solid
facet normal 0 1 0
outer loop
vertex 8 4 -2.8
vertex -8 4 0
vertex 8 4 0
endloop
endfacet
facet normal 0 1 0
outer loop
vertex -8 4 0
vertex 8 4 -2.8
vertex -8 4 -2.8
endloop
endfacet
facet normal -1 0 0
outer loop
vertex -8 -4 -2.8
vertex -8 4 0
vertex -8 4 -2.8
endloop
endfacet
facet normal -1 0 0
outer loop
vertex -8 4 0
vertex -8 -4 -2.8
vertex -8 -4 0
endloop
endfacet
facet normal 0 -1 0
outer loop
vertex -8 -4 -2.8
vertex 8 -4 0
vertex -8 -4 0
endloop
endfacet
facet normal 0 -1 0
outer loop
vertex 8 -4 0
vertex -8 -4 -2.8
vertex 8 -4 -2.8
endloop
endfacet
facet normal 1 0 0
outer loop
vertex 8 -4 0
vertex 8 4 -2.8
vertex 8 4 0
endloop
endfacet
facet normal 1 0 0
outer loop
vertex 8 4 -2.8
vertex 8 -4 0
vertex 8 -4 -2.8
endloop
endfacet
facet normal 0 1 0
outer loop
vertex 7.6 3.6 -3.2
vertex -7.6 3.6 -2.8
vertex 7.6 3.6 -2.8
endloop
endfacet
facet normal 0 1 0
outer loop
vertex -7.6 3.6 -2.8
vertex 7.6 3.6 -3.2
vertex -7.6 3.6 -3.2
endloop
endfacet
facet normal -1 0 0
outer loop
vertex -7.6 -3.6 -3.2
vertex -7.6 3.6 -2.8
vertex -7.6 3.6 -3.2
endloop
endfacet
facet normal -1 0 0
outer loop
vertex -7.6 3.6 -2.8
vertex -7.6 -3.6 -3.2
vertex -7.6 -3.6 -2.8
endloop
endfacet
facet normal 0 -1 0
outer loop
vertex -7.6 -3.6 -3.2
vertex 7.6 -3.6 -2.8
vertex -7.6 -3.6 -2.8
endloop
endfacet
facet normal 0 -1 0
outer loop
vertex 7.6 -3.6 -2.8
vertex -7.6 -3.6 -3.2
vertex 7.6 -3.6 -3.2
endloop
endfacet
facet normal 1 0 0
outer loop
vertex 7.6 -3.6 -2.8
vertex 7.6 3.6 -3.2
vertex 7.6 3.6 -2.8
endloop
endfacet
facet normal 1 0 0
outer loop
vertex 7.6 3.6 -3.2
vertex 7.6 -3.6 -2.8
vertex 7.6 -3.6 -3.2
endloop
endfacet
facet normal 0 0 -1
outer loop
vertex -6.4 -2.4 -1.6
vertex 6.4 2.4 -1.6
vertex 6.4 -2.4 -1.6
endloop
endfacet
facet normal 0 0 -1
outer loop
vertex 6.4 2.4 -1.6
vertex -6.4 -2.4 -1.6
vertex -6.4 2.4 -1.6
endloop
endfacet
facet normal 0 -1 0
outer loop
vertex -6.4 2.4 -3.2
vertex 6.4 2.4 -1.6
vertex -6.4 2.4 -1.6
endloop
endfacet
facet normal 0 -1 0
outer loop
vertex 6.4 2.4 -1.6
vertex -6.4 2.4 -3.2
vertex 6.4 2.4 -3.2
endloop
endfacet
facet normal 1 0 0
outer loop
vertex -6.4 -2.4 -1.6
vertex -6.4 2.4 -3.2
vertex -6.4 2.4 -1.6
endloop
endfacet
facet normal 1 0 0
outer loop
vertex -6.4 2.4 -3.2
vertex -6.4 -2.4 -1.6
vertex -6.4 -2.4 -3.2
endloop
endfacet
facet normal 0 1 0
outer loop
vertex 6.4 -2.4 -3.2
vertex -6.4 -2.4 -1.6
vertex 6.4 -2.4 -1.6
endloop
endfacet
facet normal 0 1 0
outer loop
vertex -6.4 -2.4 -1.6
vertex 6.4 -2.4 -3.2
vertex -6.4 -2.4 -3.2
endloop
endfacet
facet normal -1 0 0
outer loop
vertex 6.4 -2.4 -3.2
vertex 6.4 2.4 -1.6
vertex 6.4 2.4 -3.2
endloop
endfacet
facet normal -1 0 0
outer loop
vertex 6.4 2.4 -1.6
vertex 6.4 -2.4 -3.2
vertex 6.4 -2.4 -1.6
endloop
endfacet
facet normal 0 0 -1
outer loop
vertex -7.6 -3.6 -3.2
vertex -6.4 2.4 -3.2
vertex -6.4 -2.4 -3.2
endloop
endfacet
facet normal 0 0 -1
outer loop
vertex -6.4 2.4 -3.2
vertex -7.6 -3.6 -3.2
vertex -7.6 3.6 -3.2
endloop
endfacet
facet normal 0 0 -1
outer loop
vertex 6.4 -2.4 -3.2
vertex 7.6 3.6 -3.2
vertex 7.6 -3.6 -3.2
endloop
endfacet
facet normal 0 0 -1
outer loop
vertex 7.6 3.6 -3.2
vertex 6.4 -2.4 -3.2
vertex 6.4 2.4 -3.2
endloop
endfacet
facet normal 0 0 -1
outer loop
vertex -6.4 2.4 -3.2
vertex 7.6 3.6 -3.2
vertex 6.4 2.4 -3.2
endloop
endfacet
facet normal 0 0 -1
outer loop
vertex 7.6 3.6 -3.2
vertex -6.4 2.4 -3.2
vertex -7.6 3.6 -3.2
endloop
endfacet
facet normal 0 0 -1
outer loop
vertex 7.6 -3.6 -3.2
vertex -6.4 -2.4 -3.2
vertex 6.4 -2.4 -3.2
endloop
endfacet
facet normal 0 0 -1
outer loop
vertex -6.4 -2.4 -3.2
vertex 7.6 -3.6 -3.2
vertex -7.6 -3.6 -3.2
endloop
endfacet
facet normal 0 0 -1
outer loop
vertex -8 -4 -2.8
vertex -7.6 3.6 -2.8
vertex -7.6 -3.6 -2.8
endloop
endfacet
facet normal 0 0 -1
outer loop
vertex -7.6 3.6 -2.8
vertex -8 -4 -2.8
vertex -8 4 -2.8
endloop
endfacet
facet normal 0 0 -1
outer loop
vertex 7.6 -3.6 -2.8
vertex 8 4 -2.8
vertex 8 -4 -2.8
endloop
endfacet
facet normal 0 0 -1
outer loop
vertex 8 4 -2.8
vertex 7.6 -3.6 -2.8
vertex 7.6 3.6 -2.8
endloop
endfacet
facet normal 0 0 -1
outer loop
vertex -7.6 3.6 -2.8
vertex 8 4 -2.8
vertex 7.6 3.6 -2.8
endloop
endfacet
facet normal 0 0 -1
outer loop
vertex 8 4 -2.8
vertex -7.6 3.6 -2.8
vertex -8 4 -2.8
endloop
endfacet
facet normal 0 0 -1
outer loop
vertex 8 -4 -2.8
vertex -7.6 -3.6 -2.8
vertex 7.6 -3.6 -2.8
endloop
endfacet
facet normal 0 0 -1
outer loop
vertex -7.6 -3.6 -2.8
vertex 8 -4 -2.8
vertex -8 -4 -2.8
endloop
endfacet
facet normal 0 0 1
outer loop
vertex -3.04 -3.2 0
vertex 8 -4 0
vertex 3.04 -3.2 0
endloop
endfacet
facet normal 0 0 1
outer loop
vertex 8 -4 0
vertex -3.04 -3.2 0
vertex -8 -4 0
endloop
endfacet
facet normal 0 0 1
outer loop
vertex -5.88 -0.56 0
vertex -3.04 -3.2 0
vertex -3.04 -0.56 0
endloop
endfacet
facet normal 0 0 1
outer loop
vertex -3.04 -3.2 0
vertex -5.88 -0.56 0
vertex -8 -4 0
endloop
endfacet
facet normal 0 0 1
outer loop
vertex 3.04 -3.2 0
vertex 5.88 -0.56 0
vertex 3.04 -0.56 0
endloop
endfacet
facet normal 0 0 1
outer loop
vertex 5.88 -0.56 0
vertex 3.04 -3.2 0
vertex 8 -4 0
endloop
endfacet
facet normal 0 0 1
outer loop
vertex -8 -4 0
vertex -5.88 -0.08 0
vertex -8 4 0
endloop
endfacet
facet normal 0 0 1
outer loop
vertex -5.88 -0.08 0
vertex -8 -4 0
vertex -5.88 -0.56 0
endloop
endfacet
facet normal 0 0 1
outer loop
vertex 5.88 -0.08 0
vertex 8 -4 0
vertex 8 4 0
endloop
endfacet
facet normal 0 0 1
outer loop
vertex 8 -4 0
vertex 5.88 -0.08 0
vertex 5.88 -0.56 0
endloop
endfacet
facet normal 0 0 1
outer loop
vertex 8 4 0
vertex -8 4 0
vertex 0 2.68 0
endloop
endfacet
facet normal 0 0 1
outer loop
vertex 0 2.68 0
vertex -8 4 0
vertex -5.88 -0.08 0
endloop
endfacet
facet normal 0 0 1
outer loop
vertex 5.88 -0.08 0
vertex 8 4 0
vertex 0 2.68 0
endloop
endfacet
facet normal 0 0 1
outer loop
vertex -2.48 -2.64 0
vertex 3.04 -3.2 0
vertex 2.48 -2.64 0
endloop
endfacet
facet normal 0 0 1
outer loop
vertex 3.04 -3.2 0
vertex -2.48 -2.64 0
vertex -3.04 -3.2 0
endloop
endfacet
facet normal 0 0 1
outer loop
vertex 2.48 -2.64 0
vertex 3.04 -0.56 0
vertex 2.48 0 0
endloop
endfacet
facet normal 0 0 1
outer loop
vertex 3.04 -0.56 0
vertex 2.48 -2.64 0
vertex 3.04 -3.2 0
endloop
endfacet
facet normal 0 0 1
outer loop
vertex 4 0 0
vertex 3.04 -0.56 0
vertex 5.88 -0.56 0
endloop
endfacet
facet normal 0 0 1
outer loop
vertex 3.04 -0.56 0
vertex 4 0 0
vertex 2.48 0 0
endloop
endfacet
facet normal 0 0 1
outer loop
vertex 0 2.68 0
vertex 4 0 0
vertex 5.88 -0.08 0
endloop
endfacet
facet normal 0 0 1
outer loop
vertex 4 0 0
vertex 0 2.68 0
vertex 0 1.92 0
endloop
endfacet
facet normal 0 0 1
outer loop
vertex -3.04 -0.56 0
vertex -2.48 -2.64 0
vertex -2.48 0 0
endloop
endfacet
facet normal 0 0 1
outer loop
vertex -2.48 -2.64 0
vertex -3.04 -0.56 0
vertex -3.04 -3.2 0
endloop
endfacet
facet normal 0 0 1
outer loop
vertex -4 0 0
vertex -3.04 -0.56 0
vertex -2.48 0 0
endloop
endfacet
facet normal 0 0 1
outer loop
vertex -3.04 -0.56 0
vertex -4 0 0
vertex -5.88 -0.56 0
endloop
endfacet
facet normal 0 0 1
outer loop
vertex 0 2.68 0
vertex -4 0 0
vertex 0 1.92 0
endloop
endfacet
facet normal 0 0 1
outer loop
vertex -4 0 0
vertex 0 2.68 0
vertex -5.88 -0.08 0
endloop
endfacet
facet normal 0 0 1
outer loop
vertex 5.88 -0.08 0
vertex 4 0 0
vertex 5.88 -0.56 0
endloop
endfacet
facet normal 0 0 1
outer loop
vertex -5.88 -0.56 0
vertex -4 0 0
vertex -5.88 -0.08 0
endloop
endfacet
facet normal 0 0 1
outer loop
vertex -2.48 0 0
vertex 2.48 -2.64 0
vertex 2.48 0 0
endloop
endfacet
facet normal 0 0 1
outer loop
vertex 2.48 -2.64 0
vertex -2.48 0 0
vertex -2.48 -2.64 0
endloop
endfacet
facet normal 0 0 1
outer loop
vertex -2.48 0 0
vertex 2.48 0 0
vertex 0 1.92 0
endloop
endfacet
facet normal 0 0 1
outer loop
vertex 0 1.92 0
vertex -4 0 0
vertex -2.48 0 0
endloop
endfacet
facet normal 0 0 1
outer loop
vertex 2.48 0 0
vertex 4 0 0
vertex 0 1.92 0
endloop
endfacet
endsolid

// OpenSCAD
// file: ../p/4-4edge.scad
use <../lib.scad>
$fa=1; $fs=0.2;
function ldraw_lib__4_4edge(realsolid=false) = [
// 0 Circle 1.0
// 0 Name: 4-4edge.dat
// 0 Author: James Jessiman
// 0 !LDRAW_ORG Primitive UPDATE 2017-01
// 0 !LICENSE Licensed under CC BY 2.0 and CC BY 4.0 : see CAreadme.txt
// 
// 0 BFC CERTIFY CCW
  [0,"BFC","CERTIFY"],
  [0,"BFC","CCW"],
// 
// 0 !HISTORY 1998-12-15 [PTadmin] Official Update 1998-10
// 0 !HISTORY 2005-12-28 [PTadmin] Official Update 2005-01
// 0 !HISTORY 2007-06-24 [PTadmin] Header formatted for Contributor Agreement
// 0 !HISTORY 2008-07-01 [PTadmin] Official Update 2008-01
// 0 !HISTORY 2017-01-15 [Steffen] BFCed
// 0 !HISTORY 2017-12-30 [PTadmin] Official Update 2017-01
// 
// 
// 2 24 1 0 0 0.9239 0 0.3827
  [2,24,1,0,0,0.9239,0,0.3827],
// 2 24 0.9239 0 0.3827 0.7071 0 0.7071
  [2,24,0.9239,0,0.3827,0.7071,0,0.7071],
// 2 24 0.7071 0 0.7071 0.3827 0 0.9239
  [2,24,0.7071,0,0.7071,0.3827,0,0.9239],
// 2 24 0.3827 0 0.9239 0 0 1
  [2,24,0.3827,0,0.9239,0,0,1],
// 2 24 0 0 1 -0.3827 0 0.9239
  [2,24,0,0,1,-0.3827,0,0.9239],
// 2 24 -0.3827 0 0.9239 -0.7071 0 0.7071
  [2,24,-0.3827,0,0.9239,-0.7071,0,0.7071],
// 2 24 -0.7071 0 0.7071 -0.9239 0 0.3827
  [2,24,-0.7071,0,0.7071,-0.9239,0,0.3827],
// 2 24 -0.9239 0 0.3827 -1 0 -0
  [2,24,-0.9239,0,0.3827,-1,0,-0],
// 2 24 -1 0 -0 -0.9239 0 -0.3827
  [2,24,-1,0,-0,-0.9239,0,-0.3827],
// 2 24 -0.9239 0 -0.3827 -0.7071 0 -0.7071
  [2,24,-0.9239,0,-0.3827,-0.7071,0,-0.7071],
// 2 24 -0.7071 0 -0.7071 -0.3827 0 -0.9239
  [2,24,-0.7071,0,-0.7071,-0.3827,0,-0.9239],
// 2 24 -0.3827 0 -0.9239 0 0 -1
  [2,24,-0.3827,0,-0.9239,0,0,-1],
// 2 24 0 0 -1 0.3827 0 -0.9239
  [2,24,0,0,-1,0.3827,0,-0.9239],
// 2 24 0.3827 0 -0.9239 0.7071 0 -0.7071
  [2,24,0.3827,0,-0.9239,0.7071,0,-0.7071],
// 2 24 0.7071 0 -0.7071 0.9239 0 -0.3827
  [2,24,0.7071,0,-0.7071,0.9239,0,-0.3827],
// 2 24 0.9239 0 -0.3827 1 0 0
  [2,24,0.9239,0,-0.3827,1,0,0],
];
module ldraw_lib__4_4edge(step=0, col=false, unit=2/5, alt=false, line=0.2, solid=!$preview)
    makepoly(ldraw_lib__4_4edge(solid), step=step, col=col, unit=unit, alt=alt, line=line, solid=solid);
ldraw_lib__4_4edge(line=0.2);
// file: ../p/4-4disc.scad
use <../lib.scad>
$fa=1; $fs=0.2;
function ldraw_lib__4_4disc(realsolid=false) = [
// 0 Disc 1.0
// 0 Name: 4-4disc.dat
// 0 Author: James Jessiman
// 0 !LDRAW_ORG Primitive UPDATE 2002-02
// 0 !LICENSE Licensed under CC BY 2.0 and CC BY 4.0 : see CAreadme.txt
// 
// 0 BFC CERTIFY CCW
  [0,"BFC","CERTIFY"],
  [0,"BFC","CCW"],
// 
// 0 !HISTORY 1998-12-15 [PTadmin] Official Update 1998-10
// 0 !HISTORY 2002-03-23 [sbliss] Added BFC statement
// 0 !HISTORY 2002-04-25 [PTadmin] Official Update 2002-02
// 0 !HISTORY 2007-06-24 [PTadmin] Header formatted for Contributor Agreement
// 0 !HISTORY 2008-07-01 [PTadmin] Official Update 2008-01
// 
// 
// 3 16 0 0 0 1 0 0 0.9239 0 0.3827
  [3,16,0,0,0,1,0,0,0.9239,0,0.3827],
// 3 16 0 0 0 0.9239 0 0.3827 0.7071 0 0.7071
  [3,16,0,0,0,0.9239,0,0.3827,0.7071,0,0.7071],
// 3 16 0 0 0 0.7071 0 0.7071 0.3827 0 0.9239
  [3,16,0,0,0,0.7071,0,0.7071,0.3827,0,0.9239],
// 3 16 0 0 0 0.3827 0 0.9239 0 0 1
  [3,16,0,0,0,0.3827,0,0.9239,0,0,1],
// 3 16 0 0 0 0 0 1 -0.3827 0 0.9239
  [3,16,0,0,0,0,0,1,-0.3827,0,0.9239],
// 3 16 0 0 0 -0.3827 0 0.9239 -0.7071 0 0.7071
  [3,16,0,0,0,-0.3827,0,0.9239,-0.7071,0,0.7071],
// 3 16 0 0 0 -0.7071 0 0.7071 -0.9239 0 0.3827
  [3,16,0,0,0,-0.7071,0,0.7071,-0.9239,0,0.3827],
// 3 16 0 0 0 -0.9239 0 0.3827 -1 0 -0
  [3,16,0,0,0,-0.9239,0,0.3827,-1,0,-0],
// 3 16 0 0 0 -1 0 -0 -0.9239 0 -0.3827
  [3,16,0,0,0,-1,0,-0,-0.9239,0,-0.3827],
// 3 16 0 0 0 -0.9239 0 -0.3827 -0.7071 0 -0.7071
  [3,16,0,0,0,-0.9239,0,-0.3827,-0.7071,0,-0.7071],
// 3 16 0 0 0 -0.7071 0 -0.7071 -0.3827 0 -0.9239
  [3,16,0,0,0,-0.7071,0,-0.7071,-0.3827,0,-0.9239],
// 3 16 0 0 0 -0.3827 0 -0.9239 0 0 -1
  [3,16,0,0,0,-0.3827,0,-0.9239,0,0,-1],
// 3 16 0 0 0 0 0 -1 0.3827 0 -0.9239
  [3,16,0,0,0,0,0,-1,0.3827,0,-0.9239],
// 3 16 0 0 0 0.3827 0 -0.9239 0.7071 0 -0.7071
  [3,16,0,0,0,0.3827,0,-0.9239,0.7071,0,-0.7071],
// 3 16 0 0 0 0.7071 0 -0.7071 0.9239 0 -0.3827
  [3,16,0,0,0,0.7071,0,-0.7071,0.9239,0,-0.3827],
// 3 16 0 0 0 0.9239 0 -0.3827 1 0 0
  [3,16,0,0,0,0.9239,0,-0.3827,1,0,0],
// 0
];
module ldraw_lib__4_4disc(step=0, col=false, unit=2/5, alt=false, line=0.2, solid=!$preview)
    makepoly(ldraw_lib__4_4disc(solid), step=step, col=col, unit=unit, alt=alt, line=line, solid=solid);
ldraw_lib__4_4disc(line=0.2);
// file: ../p/4-4cyli.scad
use <../lib.scad>
$fa=1; $fs=0.2;
function ldraw_lib__4_4cyli(realsolid=false) = [
// 0 Cylinder 1.0
// 0 Name: 4-4cyli.dat
// 0 Author: James Jessiman
// 0 !LDRAW_ORG Primitive UPDATE 2005-01
// 0 !LICENSE Licensed under CC BY 2.0 and CC BY 4.0 : see CAreadme.txt
// 
// 0 BFC CERTIFY CCW
  [0,"BFC","CERTIFY"],
  [0,"BFC","CCW"],
// 
// 0 !HISTORY 1998-12-15 [PTadmin] Official Update 1998-10
// 0 !HISTORY 2002-03-23 [sbliss] Added BFC statement; merged headers from files in distributions LDraw 0.27 and Complete.
// 0 !HISTORY 2002-04-25 [PTadmin] Official Update 2002-02
// 0 !HISTORY 2004-12-14 [guyvivan] BFC CCW
// 0 !HISTORY 2005-12-28 [PTadmin] Official Update 2005-01
// 0 !HISTORY 2007-06-24 [PTadmin] Header formatted for Contributor Agreement
// 0 !HISTORY 2008-07-01 [PTadmin] Official Update 2008-01
// 
// 
// 4 16 1 1 0 0.9239 1 0.3827 0.9239 0 0.3827 1 0 0
  [4,16,1,1,0,0.9239,1,0.3827,0.9239,0,0.3827,1,0,0],
// 5 24 1 0 0 1 1 0 0.9239 0 0.3827 0.9239 0 -0.3827
  [5,24,1,0,0,1,1,0,0.9239,0,0.3827,0.9239,0,-0.3827],
// 4 16 0.9239 1 0.3827 0.7071 1 0.7071 0.7071 0 0.7071 0.9239 0 0.3827
  [4,16,0.9239,1,0.3827,0.7071,1,0.7071,0.7071,0,0.7071,0.9239,0,0.3827],
// 5 24 0.9239 0 0.3827 0.9239 1 0.3827 0.7071 0 0.7071 1 0 0
  [5,24,0.9239,0,0.3827,0.9239,1,0.3827,0.7071,0,0.7071,1,0,0],
// 4 16 0.7071 1 0.7071 0.3827 1 0.9239 0.3827 0 0.9239 0.7071 0 0.7071
  [4,16,0.7071,1,0.7071,0.3827,1,0.9239,0.3827,0,0.9239,0.7071,0,0.7071],
// 5 24 0.7071 0 0.7071 0.7071 1 0.7071 0.3827 0 0.9239 0.9239 0 0.3827
  [5,24,0.7071,0,0.7071,0.7071,1,0.7071,0.3827,0,0.9239,0.9239,0,0.3827],
// 4 16 0.3827 1 0.9239 0 1 1 0 0 1 0.3827 0 0.9239
  [4,16,0.3827,1,0.9239,0,1,1,0,0,1,0.3827,0,0.9239],
// 5 24 0.3827 0 0.9239 0.3827 1 0.9239 0 0 1 0.7071 0 0.7071
  [5,24,0.3827,0,0.9239,0.3827,1,0.9239,0,0,1,0.7071,0,0.7071],
// 4 16 0 1 1 -0.3827 1 0.9239 -0.3827 0 0.9239 0 0 1
  [4,16,0,1,1,-0.3827,1,0.9239,-0.3827,0,0.9239,0,0,1],
// 5 24 0 0 1 0 1 1 -0.3827 0 0.9239 0.3827 0 0.9239
  [5,24,0,0,1,0,1,1,-0.3827,0,0.9239,0.3827,0,0.9239],
// 4 16 -0.3827 1 0.9239 -0.7071 1 0.7071 -0.7071 0 0.7071 -0.3827 0 0.9239
  [4,16,-0.3827,1,0.9239,-0.7071,1,0.7071,-0.7071,0,0.7071,-0.3827,0,0.9239],
// 5 24 -0.3827 0 0.9239 -0.3827 1 0.9239 -0.7071 0 0.7071 0 0 1
  [5,24,-0.3827,0,0.9239,-0.3827,1,0.9239,-0.7071,0,0.7071,0,0,1],
// 4 16 -0.7071 1 0.7071 -0.9239 1 0.3827 -0.9239 0 0.3827 -0.7071 0 0.7071
  [4,16,-0.7071,1,0.7071,-0.9239,1,0.3827,-0.9239,0,0.3827,-0.7071,0,0.7071],
// 5 24 -0.7071 0 0.7071 -0.7071 1 0.7071 -0.9239 0 0.3827 -0.3827 0 0.9239
  [5,24,-0.7071,0,0.7071,-0.7071,1,0.7071,-0.9239,0,0.3827,-0.3827,0,0.9239],
// 4 16 -0.9239 1 0.3827 -1 1 0 -1 0 0 -0.9239 0 0.3827
  [4,16,-0.9239,1,0.3827,-1,1,0,-1,0,0,-0.9239,0,0.3827],
// 5 24 -0.9239 0 0.3827 -0.9239 1 0.3827 -1 0 0 -0.7071 0 0.7071
  [5,24,-0.9239,0,0.3827,-0.9239,1,0.3827,-1,0,0,-0.7071,0,0.7071],
// 4 16 -1 1 0 -0.9239 1 -0.3827 -0.9239 0 -0.3827 -1 0 0
  [4,16,-1,1,0,-0.9239,1,-0.3827,-0.9239,0,-0.3827,-1,0,0],
// 5 24 -1 0 0 -1 1 0 -0.9239 0 -0.3827 -0.9239 0 0.3827
  [5,24,-1,0,0,-1,1,0,-0.9239,0,-0.3827,-0.9239,0,0.3827],
// 4 16 -0.9239 1 -0.3827 -0.7071 1 -0.7071 -0.7071 0 -0.7071 -0.9239 0 -0.3827
  [4,16,-0.9239,1,-0.3827,-0.7071,1,-0.7071,-0.7071,0,-0.7071,-0.9239,0,-0.3827],
// 5 24 -0.9239 0 -0.3827 -0.9239 1 -0.3827 -0.7071 0 -0.7071 -1 0 0
  [5,24,-0.9239,0,-0.3827,-0.9239,1,-0.3827,-0.7071,0,-0.7071,-1,0,0],
// 4 16 -0.7071 1 -0.7071 -0.3827 1 -0.9239 -0.3827 0 -0.9239 -0.7071 0 -0.7071
  [4,16,-0.7071,1,-0.7071,-0.3827,1,-0.9239,-0.3827,0,-0.9239,-0.7071,0,-0.7071],
// 5 24 -0.7071 0 -0.7071 -0.7071 1 -0.7071 -0.3827 0 -0.9239 -0.9239 0 -0.3827
  [5,24,-0.7071,0,-0.7071,-0.7071,1,-0.7071,-0.3827,0,-0.9239,-0.9239,0,-0.3827],
// 4 16 -0.3827 1 -0.9239 0 1 -1 0 0 -1 -0.3827 0 -0.9239
  [4,16,-0.3827,1,-0.9239,0,1,-1,0,0,-1,-0.3827,0,-0.9239],
// 5 24 -0.3827 0 -0.9239 -0.3827 1 -0.9239 0 0 -1 -0.7071 0 -0.7071
  [5,24,-0.3827,0,-0.9239,-0.3827,1,-0.9239,0,0,-1,-0.7071,0,-0.7071],
// 4 16 0 1 -1 0.3827 1 -0.9239 0.3827 0 -0.9239 0 0 -1
  [4,16,0,1,-1,0.3827,1,-0.9239,0.3827,0,-0.9239,0,0,-1],
// 5 24 0 0 -1 0 1 -1 0.3827 0 -0.9239 -0.3827 0 -0.9239
  [5,24,0,0,-1,0,1,-1,0.3827,0,-0.9239,-0.3827,0,-0.9239],
// 4 16 0.3827 1 -0.9239 0.7071 1 -0.7071 0.7071 0 -0.7071 0.3827 0 -0.9239
  [4,16,0.3827,1,-0.9239,0.7071,1,-0.7071,0.7071,0,-0.7071,0.3827,0,-0.9239],
// 5 24 0.3827 0 -0.9239 0.3827 1 -0.9239 0.7071 0 -0.7071 0 0 -1
  [5,24,0.3827,0,-0.9239,0.3827,1,-0.9239,0.7071,0,-0.7071,0,0,-1],
// 4 16 0.7071 1 -0.7071 0.9239 1 -0.3827 0.9239 0 -0.3827 0.7071 0 -0.7071
  [4,16,0.7071,1,-0.7071,0.9239,1,-0.3827,0.9239,0,-0.3827,0.7071,0,-0.7071],
// 5 24 0.7071 0 -0.7071 0.7071 1 -0.7071 0.9239 0 -0.3827 0.3827 0 -0.9239
  [5,24,0.7071,0,-0.7071,0.7071,1,-0.7071,0.9239,0,-0.3827,0.3827,0,-0.9239],
// 4 16 0.9239 1 -0.3827 1 1 0 1 0 0 0.9239 0 -0.3827
  [4,16,0.9239,1,-0.3827,1,1,0,1,0,0,0.9239,0,-0.3827],
// 5 24 0.9239 0 -0.3827 0.9239 1 -0.3827 1 0 0 0.7071 0 -0.7071
  [5,24,0.9239,0,-0.3827,0.9239,1,-0.3827,1,0,0,0.7071,0,-0.7071],
// 0
];
module ldraw_lib__4_4cyli(step=0, col=false, unit=2/5, alt=false, line=0.2, solid=!$preview)
    makepoly(ldraw_lib__4_4cyli(solid), step=step, col=col, unit=unit, alt=alt, line=line, solid=solid);
ldraw_lib__4_4cyli(line=0.2);
// file: ../p/stud3.scad
use <../lib.scad>
use <4-4cyli.scad>
use <4-4disc.scad>
use <4-4edge.scad>
$fa=1; $fs=0.2;
function ldraw_lib__stud3(realsolid=false) = realsolid ? 
    [openscad(translate([0,0,-eps()], o=cylinder(4+eps(), r=4)),2)] : [
// 0 Stud Tube Solid
// 0 Name: stud3.dat
// 0 Author: James Jessiman
// 0 !LDRAW_ORG Primitive UPDATE 2012-01
// 0 !LICENSE Licensed under CC BY 2.0 and CC BY 4.0 : see CAreadme.txt
// 
// 0 BFC CERTIFY CCW
  [0,"BFC","CERTIFY"],
  [0,"BFC","CCW"],
// 
// 0 !HISTORY 2002-04-04 [sbliss] Modified for BFC compliance
// 0 !HISTORY 2002-04-25 [PTadmin] Official Update 2002-02
// 0 !HISTORY 2007-06-24 [PTadmin] Header formatted for Contributor Agreement
// 0 !HISTORY 2008-07-01 [PTadmin] Official Update 2008-01
// 0 !HISTORY 2012-02-16 [Philo] Changed to CCW
// 0 !HISTORY 2012-03-30 [PTadmin] Official Update 2012-01
// 
// 
// 1 16 0 -4 0 4 0 0 0 1 0 0 0 4 4-4edge.dat
  [1,16,0,-4,0,4,0,0,0,1,0,0,0,4, ldraw_lib__4_4edge(realsolid)],
// 1 16 0 0 0 4 0 0 0 1 0 0 0 4 4-4edge.dat
  [1,16,0,0,0,4,0,0,0,1,0,0,0,4, ldraw_lib__4_4edge(realsolid)],
// 1 16 0 -4 0 4 0 0 0 1 0 0 0 4 4-4disc.dat
  [1,16,0,-4,0,4,0,0,0,1,0,0,0,4, ldraw_lib__4_4disc(realsolid)],
// 1 16 0 -4 0 4 0 0 0 4 0 0 0 4 4-4cyli.dat
  [1,16,0,-4,0,4,0,0,0,4,0,0,0,4, ldraw_lib__4_4cyli(realsolid)],
];
module ldraw_lib__stud3(step=0, col=false, unit=2/5, alt=false, line=0.2, solid=!$preview)
    makepoly(ldraw_lib__stud3(solid), step=step, col=col, unit=unit, alt=alt, line=line, solid=solid);
ldraw_lib__stud3(line=0.2);
// file: ../p/stud.scad
use <../lib.scad>
use <4-4cyli.scad>
use <4-4disc.scad>
use <4-4edge.scad>
$fa=1; $fs=0.2;
function ldraw_lib__stud(realsolid=false) = realsolid ? 
    [openscad(translate([0,0,-eps()], o=cylinder(4+eps(), r=6)),2)] : [
// 0 Stud
// 0 Name: stud.dat
// 0 Author: James Jessiman
// 0 !LDRAW_ORG Primitive UPDATE 2012-01
// 0 !LICENSE Licensed under CC BY 2.0 and CC BY 4.0 : see CAreadme.txt
// 
// 0 BFC CERTIFY CCW
  [0,"BFC","CERTIFY"],
  [0,"BFC","CCW"],
// 
// 0 !HISTORY 2002-04-04 [sbliss] Modified for BFC compliance
// 0 !HISTORY 2002-04-25 [PTadmin] Official Update 2002-02
// 0 !HISTORY 2007-06-24 [PTadmin] Header formatted for Contributor Agreement
// 0 !HISTORY 2008-07-01 [PTadmin] Official Update 2008-01
// 0 !HISTORY 2012-02-16 [Philo] Changed to CCW
// 0 !HISTORY 2012-03-30 [PTadmin] Official Update 2012-01
// 
// 
// 1 16 0 0 0 6 0 0 0 1 0 0 0 6 4-4edge.dat
  [1,16,0,0,0,6,0,0,0,1,0,0,0,6, ldraw_lib__4_4edge(realsolid)],
// 1 16 0 -4 0 6 0 0 0 1 0 0 0 6 4-4edge.dat
  [1,16,0,-4,0,6,0,0,0,1,0,0,0,6, ldraw_lib__4_4edge(realsolid)],
// 1 16 0 0 0 6 0 0 0 -4 0 0 0 6 4-4cyli.dat
  [1,16,0,0,0,6,0,0,0,-4,0,0,0,6, ldraw_lib__4_4cyli(realsolid)],
// 1 16 0 -4 0 6 0 0 0 1 0 0 0 6 4-4disc.dat
  [1,16,0,-4,0,6,0,0,0,1,0,0,0,6, ldraw_lib__4_4disc(realsolid)],
];
module ldraw_lib__stud(step=0, col=false, unit=2/5, alt=false, line=0.2, solid=!$preview)
    makepoly(ldraw_lib__stud(solid), step=step, col=col, unit=unit, alt=alt, line=line, solid=solid);
ldraw_lib__stud(line=0.2);
// file: ../p/box4t.scad
use <../lib.scad>
$fa=1; $fs=0.2;
function ldraw_lib__box4t(realsolid=false) = [
// 0 Box with 4 Adjacent Faces and All Edges
// 0 Name: box4t.dat
// 0 Author: Tore Eriksson [Tore_Eriksson]
// 0 !LDRAW_ORG Primitive UPDATE 2003-02
// 0 !LICENSE Licensed under CC BY 2.0 and CC BY 4.0 : see CAreadme.txt
// 
// 0 BFC CERTIFY CCW
  [0,"BFC","CERTIFY"],
  [0,"BFC","CCW"],
// 
// 0 !HISTORY 1997-09-29 [PTadmin] Official Update 1997-15
// 0 !HISTORY 2002-08-31 [izanette] Modified with WINDZ for BFC compliance
// 0 !HISTORY 2003-08-01 [PTadmin] Official Update 2003-02
// 0 !HISTORY 2007-06-24 [PTadmin] Header formatted for Contributor Agreement
// 0 !HISTORY 2008-07-01 [PTadmin] Official Update 2008-01
// 
// 
// 2 24 1 1 1 -1 1 1
  [2,24,1,1,1,-1,1,1],
// 2 24 -1 1 1 -1 1 -1
  [2,24,-1,1,1,-1,1,-1],
// 2 24 -1 1 -1 1 1 -1
  [2,24,-1,1,-1,1,1,-1],
// 2 24 1 1 -1 1 1 1
  [2,24,1,1,-1,1,1,1],
// 2 24 1 0 1 -1 0 1
  [2,24,1,0,1,-1,0,1],
// 2 24 -1 0 1 -1 0 -1
  [2,24,-1,0,1,-1,0,-1],
// 2 24 -1 0 -1 1 0 -1
  [2,24,-1,0,-1,1,0,-1],
// 2 24 1 0 -1 1 0 1
  [2,24,1,0,-1,1,0,1],
// 2 24 1 0 1 1 1 1
  [2,24,1,0,1,1,1,1],
// 2 24 -1 0 1 -1 1 1
  [2,24,-1,0,1,-1,1,1],
// 2 24 1 0 -1 1 1 -1
  [2,24,1,0,-1,1,1,-1],
// 2 24 -1 0 -1 -1 1 -1
  [2,24,-1,0,-1,-1,1,-1],
// 4 16 1 1 1 1 1 -1 -1 1 -1 -1 1 1
  [4,16,1,1,1,1,1,-1,-1,1,-1,-1,1,1],
// 4 16 1 1 1 -1 1 1 -1 0 1 1 0 1
  [4,16,1,1,1,-1,1,1,-1,0,1,1,0,1],
// 4 16 -1 1 1 -1 1 -1 -1 0 -1 -1 0 1
  [4,16,-1,1,1,-1,1,-1,-1,0,-1,-1,0,1],
// 0 4 16 -1 1 -1 -1 0 -1 1 0 -1 1 1 -1
// 4 16 1 1 -1 1 1 1 1 0 1 1 0 -1
  [4,16,1,1,-1,1,1,1,1,0,1,1,0,-1],
// 0
];
module ldraw_lib__box4t(step=0, col=false, unit=2/5, alt=false, line=0.2, solid=!$preview)
    makepoly(ldraw_lib__box4t(solid), step=step, col=col, unit=unit, alt=alt, line=line, solid=solid);
ldraw_lib__box4t(line=0.2);
// file: ../p/box5.scad
use <../lib.scad>
$fa=1; $fs=0.2;
function ldraw_lib__box5(realsolid=false) = [
// 0 Box with 5 Faces and All Edges
// 0 Name: box5.dat
// 0 Author: James Jessiman
// 0 !LDRAW_ORG Primitive UPDATE 2012-01
// 0 !LICENSE Licensed under CC BY 2.0 and CC BY 4.0 : see CAreadme.txt
// 
// 0 BFC CERTIFY CCW
  [0,"BFC","CERTIFY"],
  [0,"BFC","CCW"],
// 
// 0 !HISTORY 2002-04-03 [sbliss] Modified for BFC compliance
// 0 !HISTORY 2002-04-25 [PTadmin] Official Update 2002-02
// 0 !HISTORY 2007-06-24 [PTadmin] Header formatted for Contributor Agreement
// 0 !HISTORY 2008-07-01 [PTadmin] Official Update 2008-01
// 0 !HISTORY 2012-02-16 [Philo] Changed to CCW
// 0 !HISTORY 2012-03-30 [PTadmin] Official Update 2012-01
// 
// 
// 2 24 1 1 1 -1 1 1
  [2,24,1,1,1,-1,1,1],
// 2 24 -1 1 1 -1 1 -1
  [2,24,-1,1,1,-1,1,-1],
// 2 24 -1 1 -1 1 1 -1
  [2,24,-1,1,-1,1,1,-1],
// 2 24 1 1 -1 1 1 1
  [2,24,1,1,-1,1,1,1],
// 2 24 1 0 1 -1 0 1
  [2,24,1,0,1,-1,0,1],
// 2 24 -1 0 1 -1 0 -1
  [2,24,-1,0,1,-1,0,-1],
// 2 24 -1 0 -1 1 0 -1
  [2,24,-1,0,-1,1,0,-1],
// 2 24 1 0 -1 1 0 1
  [2,24,1,0,-1,1,0,1],
// 2 24 1 0 1 1 1 1
  [2,24,1,0,1,1,1,1],
// 2 24 -1 0 1 -1 1 1
  [2,24,-1,0,1,-1,1,1],
// 2 24 1 0 -1 1 1 -1
  [2,24,1,0,-1,1,1,-1],
// 2 24 -1 0 -1 -1 1 -1
  [2,24,-1,0,-1,-1,1,-1],
// 4 16 -1 1 1 1 1 1 1 1 -1 -1 1 -1
  [4,16,-1,1,1,1,1,1,1,1,-1,-1,1,-1],
// 4 16 -1 1 1 -1 0 1 1 0 1 1 1 1
  [4,16,-1,1,1,-1,0,1,1,0,1,1,1,1],
// 4 16 -1 1 -1 -1 0 -1 -1 0 1 -1 1 1
  [4,16,-1,1,-1,-1,0,-1,-1,0,1,-1,1,1],
// 4 16 1 1 -1 1 0 -1 -1 0 -1 -1 1 -1
  [4,16,1,1,-1,1,0,-1,-1,0,-1,-1,1,-1],
// 4 16 1 1 1 1 0 1 1 0 -1 1 1 -1
  [4,16,1,1,1,1,0,1,1,0,-1,1,1,-1],
];
module ldraw_lib__box5(step=0, col=false, unit=2/5, alt=false, line=0.2, solid=!$preview)
    makepoly(ldraw_lib__box5(solid), step=step, col=col, unit=unit, alt=alt, line=line, solid=solid);
ldraw_lib__box5(line=0.2);
// file: ../p/box4.scad
use <../lib.scad>
$fa=1; $fs=0.2;
function ldraw_lib__box4(realsolid=false) = [
// 0 Box with 4 Faces (2 Parallel Pairs) and All Edges
// 0 Name: box4.dat
// 0 Author: James Jessiman
// 0 !LDRAW_ORG Primitive UPDATE 2012-01
// 0 !LICENSE Licensed under CC BY 2.0 and CC BY 4.0 : see CAreadme.txt
// 
// 0 BFC CERTIFY CCW
  [0,"BFC","CERTIFY"],
  [0,"BFC","CCW"],
// 
// 0 !HISTORY 2002-04-03 [sbliss] Modified for BFC compliance
// 0 !HISTORY 2002-04-25 [PTadmin] Official Update 2002-02
// 0 !HISTORY 2007-06-24 [PTadmin] Header formatted for Contributor Agreement
// 0 !HISTORY 2008-07-01 [PTadmin] Official Update 2008-01
// 0 !HISTORY 2012-02-16 [Philo] Changed to CCW
// 0 !HISTORY 2012-03-30 [PTadmin] Official Update 2012-01
// 
// 
// 2 24 1 1 1 -1 1 1
  [2,24,1,1,1,-1,1,1],
// 2 24 -1 1 1 -1 1 -1
  [2,24,-1,1,1,-1,1,-1],
// 2 24 -1 1 -1 1 1 -1
  [2,24,-1,1,-1,1,1,-1],
// 2 24 1 1 -1 1 1 1
  [2,24,1,1,-1,1,1,1],
// 2 24 1 0 1 -1 0 1
  [2,24,1,0,1,-1,0,1],
// 2 24 -1 0 1 -1 0 -1
  [2,24,-1,0,1,-1,0,-1],
// 2 24 -1 0 -1 1 0 -1
  [2,24,-1,0,-1,1,0,-1],
// 2 24 1 0 -1 1 0 1
  [2,24,1,0,-1,1,0,1],
// 2 24 1 0 1 1 1 1
  [2,24,1,0,1,1,1,1],
// 2 24 -1 0 1 -1 1 1
  [2,24,-1,0,1,-1,1,1],
// 2 24 1 0 -1 1 1 -1
  [2,24,1,0,-1,1,1,-1],
// 2 24 -1 0 -1 -1 1 -1
  [2,24,-1,0,-1,-1,1,-1],
// 4 16 -1 1 1 -1 0 1 1 0 1 1 1 1
  [4,16,-1,1,1,-1,0,1,1,0,1,1,1,1],
// 4 16 -1 1 -1 -1 0 -1 -1 0 1 -1 1 1
  [4,16,-1,1,-1,-1,0,-1,-1,0,1,-1,1,1],
// 4 16 1 1 -1 1 0 -1 -1 0 -1 -1 1 -1
  [4,16,1,1,-1,1,0,-1,-1,0,-1,-1,1,-1],
// 4 16 1 1 1 1 0 1 1 0 -1 1 1 -1
  [4,16,1,1,1,1,0,1,1,0,-1,1,1,-1],
];
module ldraw_lib__box4(step=0, col=false, unit=2/5, alt=false, line=0.2, solid=!$preview)
    makepoly(ldraw_lib__box4(solid), step=step, col=col, unit=unit, alt=alt, line=line, solid=solid);
ldraw_lib__box4(line=0.2);
// file: s/3004s01.scad
use <../../lib.scad>
use <../../p/box4t.scad>
use <../../p/box5.scad>
use <../../p/stud.scad>
use <../../p/stud3.scad>
$fa=1; $fs=0.2;
function ldraw_lib__s__3004s01(realsolid=false) = [
// 0 ~Brick  1 x  2 without Front Face
// 0 Name: s\3004s01.dat
// 0 Author: James Jessiman
// 0 !LDRAW_ORG Subpart UPDATE 2003-03
// 0 !LICENSE Licensed under CC BY 2.0 and CC BY 4.0 : see CAreadme.txt
// 
// 0 BFC CERTIFY CCW
  [0,"BFC","CERTIFY"],
  [0,"BFC","CCW"],
// 
// 0 !HISTORY 2003-09-07 [jriley] Subfiling, BFC
// 0 !HISTORY 2003-12-19 [PTadmin] Official Update 2003-03
// 0 !HISTORY 2007-08-29 [PTadmin] Header formatted for Contributor Agreement
// 0 !HISTORY 2008-07-01 [PTadmin] Official Update 2008-01
// 
// 
// 1 16 0 4 0 1 0 0 0 -5 0 0 0 1 stud3.dat
  [1,16,0,4,0,1,0,0,0,-5,0,0,0,1, ldraw_lib__stud3(realsolid)],
// 0 BFC INVERTNEXT
  [0,"BFC","INVERTNEXT"],
// 1 16 0 24 0 16 0 0 0 -20 0 0 0 6 box5.dat
  [1,16,0,24,0,16,0,0,0,-20,0,0,0,6, ldraw_lib__box5(realsolid)],
// 4 16 20 24 10 16 24 6 -16 24 6 -20 24 10
  [4,16,20,24,10,16,24,6,-16,24,6,-20,24,10],
// 4 16 -20 24 10 -16 24 6 -16 24 -6 -20 24 -10
  [4,16,-20,24,10,-16,24,6,-16,24,-6,-20,24,-10],
// 4 16 -20 24 -10 -16 24 -6 16 24 -6 20 24 -10
  [4,16,-20,24,-10,-16,24,-6,16,24,-6,20,24,-10],
// 4 16 20 24 -10 16 24 -6 16 24 6 20 24 10
  [4,16,20,24,-10,16,24,-6,16,24,6,20,24,10],
// 1 16 0 24 0 20 0 0 0 -24 0 0 0 10 box4t.dat
  [1,16,0,24,0,20,0,0,0,-24,0,0,0,10, ldraw_lib__box4t(realsolid)],
// 1 16 10 0 0 1 0 0 0 1 0 0 0 1 stud.dat
  [1,16,10,0,0,1,0,0,0,1,0,0,0,1, ldraw_lib__stud(realsolid)],
// 1 16 -10 0 0 1 0 0 0 1 0 0 0 1 stud.dat
  [1,16,-10,0,0,1,0,0,0,1,0,0,0,1, ldraw_lib__stud(realsolid)],
// 0
];
module ldraw_lib__s__3004s01(step=0, col=false, unit=2/5, alt=false, line=0.2, solid=!$preview)
    makepoly(ldraw_lib__s__3004s01(solid), step=step, col=col, unit=unit, alt=alt, line=line, solid=solid);
ldraw_lib__s__3004s01(line=0.2);
// file: s/3069p13c.scad
use <../../lib.scad>
$fa=1; $fs=0.2;
function ldraw_lib__s__3069p13c(realsolid=false) = [
// 0 ~Tile  1 x  2 with Arrow Short Pattern - Arrow
// 0 Name: s\3069p13c.dat
// 0 Author: Alex Taylor [anathema]
// 0 !LDRAW_ORG Subpart UPDATE 2010-02
// 0 !LICENSE Licensed under CC BY 2.0 and CC BY 4.0 : see CAreadme.txt
// 
// 0 BFC CERTIFY CCW
  [0,"BFC","CERTIFY"],
  [0,"BFC","CCW"],
// 
// 0 !HISTORY 2010-07-05 [PTadmin] Official Update 2010-02
// 
// 
// 4 16 -6.2 0 -6.6 6.2 0 -6.6 6.2 0 0 -6.2 0 0
  [4,16,-6.2,0,-6.6,6.2,0,-6.6,6.2,0,0,-6.2,0,0],
// 3 16 -6.2 0 0 6.2 0 0 0 0 4.8
  [3,16,-6.2,0,0,6.2,0,0,0,0,4.8],
// 3 16 0 0 4.8 -10 0 0 -6.2 0 0
  [3,16,0,0,4.8,-10,0,0,-6.2,0,0],
// 3 16 6.2 0 0 10 0 0 0 0 4.8
  [3,16,6.2,0,0,10,0,0,0,0,4.8],
// 0
];
module ldraw_lib__s__3069p13c(step=0, col=false, unit=2/5, alt=false, line=0.2, solid=!$preview)
    makepoly(ldraw_lib__s__3069p13c(solid), step=step, col=col, unit=unit, alt=alt, line=line, solid=solid);
ldraw_lib__s__3069p13c(line=0.2);
// file: s/3069p13b.scad
use <../../lib.scad>
$fa=1; $fs=0.2;
function ldraw_lib__s__3069p13b(realsolid=false) = [
// 0 ~Tile  1 x  2 with Arrow Short Pattern - Border
// 0 Name: s\3069p13b.dat
// 0 Author: Alex Taylor [anathema]
// 0 !LDRAW_ORG Subpart UPDATE 2010-02
// 0 !LICENSE Licensed under CC BY 2.0 and CC BY 4.0 : see CAreadme.txt
// 
// 0 BFC CERTIFY CCW
  [0,"BFC","CERTIFY"],
  [0,"BFC","CCW"],
// 
// 0 !HISTORY 2010-07-05 [PTadmin] Official Update 2010-02
// 
// 
// 4 16 -7.6 0 -8 7.6 0 -8 6.2 0 -6.6 -6.2 0 -6.6
  [4,16,-7.6,0,-8,7.6,0,-8,6.2,0,-6.6,-6.2,0,-6.6],
// 4 16 6.2 0 0 6.2 0 -6.6 7.6 0 -8 7.6 0 -1.4
  [4,16,6.2,0,0,6.2,0,-6.6,7.6,0,-8,7.6,0,-1.4],
// 4 16 7.6 0 -1.4 14.7 0 -1.4 10 0 0 6.2 0 0
  [4,16,7.6,0,-1.4,14.7,0,-1.4,10,0,0,6.2,0,0],
// 4 16 0 0 4.8 10 0 0 14.7 0 -0.2 0 0 6.7
  [4,16,0,0,4.8,10,0,0,14.7,0,-0.2,0,0,6.7],
// 4 16 -7.6 0 -1.4 -7.6 0 -8 -6.2 0 -6.6 -6.2 0 0
  [4,16,-7.6,0,-1.4,-7.6,0,-8,-6.2,0,-6.6,-6.2,0,0],
// 4 16 -6.2 0 0 -10 0 0 -14.7 0 -1.4 -7.6 0 -1.4
  [4,16,-6.2,0,0,-10,0,0,-14.7,0,-1.4,-7.6,0,-1.4],
// 4 16 0 0 6.7 -14.7 0 -0.2 -10 0 0 0 0 4.8
  [4,16,0,0,6.7,-14.7,0,-0.2,-10,0,0,0,0,4.8],
// 3 16 14.7 0 -0.2 10 0 0 14.7 0 -1.4
  [3,16,14.7,0,-0.2,10,0,0,14.7,0,-1.4],
// 3 16 -14.7 0 -1.4 -10 0 0 -14.7 0 -0.2
  [3,16,-14.7,0,-1.4,-10,0,0,-14.7,0,-0.2],
// 0
];
module ldraw_lib__s__3069p13b(step=0, col=false, unit=2/5, alt=false, line=0.2, solid=!$preview)
    makepoly(ldraw_lib__s__3069p13b(solid), step=step, col=col, unit=unit, alt=alt, line=line, solid=solid);
ldraw_lib__s__3069p13b(line=0.2);
// file: s/3069p13a.scad
use <../../lib.scad>
$fa=1; $fs=0.2;
function ldraw_lib__s__3069p13a(realsolid=false) = [
// 0 ~Tile  1 x  2 with Arrow Short Pattern - Mask
// 0 Name: s\3069p13a.dat
// 0 Author: Alex Taylor [anathema]
// 0 !LDRAW_ORG Subpart UPDATE 2010-02
// 0 !LICENSE Licensed under CC BY 2.0 and CC BY 4.0 : see CAreadme.txt
// 
// 0 BFC CERTIFY CCW
  [0,"BFC","CERTIFY"],
  [0,"BFC","CCW"],
// 
// 0 !HISTORY 2010-07-05 [PTadmin] Official Update 2010-02
// 
// 
// 4 16 -20 0 -10 20 0 -10 7.6 0 -8 -7.6 0 -8
  [4,16,-20,0,-10,20,0,-10,7.6,0,-8,-7.6,0,-8],
// 4 16 -7.6 0 -8 -7.6 0 -1.4 -14.7 0 -1.4 -20 0 -10
  [4,16,-7.6,0,-8,-7.6,0,-1.4,-14.7,0,-1.4,-20,0,-10],
// 4 16 20 0 -10 14.7 0 -1.4 7.6 0 -1.4 7.6 0 -8
  [4,16,20,0,-10,14.7,0,-1.4,7.6,0,-1.4,7.6,0,-8],
// 4 16 -20 0 -10 -14.7 0 -1.4 -14.7 0 -0.2 -20 0 10
  [4,16,-20,0,-10,-14.7,0,-1.4,-14.7,0,-0.2,-20,0,10],
// 4 16 20 0 10 14.7 0 -0.2 14.7 0 -1.4 20 0 -10
  [4,16,20,0,10,14.7,0,-0.2,14.7,0,-1.4,20,0,-10],
// 3 16 20 0 10 -20 0 10 0 0 6.7
  [3,16,20,0,10,-20,0,10,0,0,6.7],
// 3 16 0 0 6.7 -20 0 10 -14.7 0 -0.2
  [3,16,0,0,6.7,-20,0,10,-14.7,0,-0.2],
// 3 16 14.7 0 -0.2 20 0 10 0 0 6.7
  [3,16,14.7,0,-0.2,20,0,10,0,0,6.7],
// 0
];
module ldraw_lib__s__3069p13a(step=0, col=false, unit=2/5, alt=false, line=0.2, solid=!$preview)
    makepoly(ldraw_lib__s__3069p13a(solid), step=step, col=col, unit=unit, alt=alt, line=line, solid=solid);
ldraw_lib__s__3069p13a(line=0.2);
// file: s/3069bs01.scad
use <../../lib.scad>
use <../../p/box4.scad>
use <../../p/box5.scad>
$fa=1; $fs=0.2;
function ldraw_lib__s__3069bs01(realsolid=false) = [
// 0 ~Tile  1 x  2 with Groove without Top Face
// 0 Name: s\3069bs01.dat
// 0 Author: Santeri Piippo [arezey]
// 0 !LDRAW_ORG Subpart UPDATE 2010-02
// 0 !LICENSE Licensed under CC BY 2.0 and CC BY 4.0 : see CAreadme.txt
// 
// 0 BFC CERTIFY CCW
  [0,"BFC","CERTIFY"],
  [0,"BFC","CCW"],
// 
// 0 !HISTORY 2010-07-05 [PTadmin] Official Update 2010-02
// 
// 
// 1 16 0 0 0 20 0 0 0 7 0 0 0 10 box4.dat
  [1,16,0,0,0,20,0,0,0,7,0,0,0,10, ldraw_lib__box4(realsolid)],
// 1 16 0 7 0 19 0 0 0 1 0 0 0 9 box4.dat
  [1,16,0,7,0,19,0,0,0,1,0,0,0,9, ldraw_lib__box4(realsolid)],
// 0 BFC INVERTNEXT
  [0,"BFC","INVERTNEXT"],
// 1 16 0 8 0 16 0 0 0 -4 0 0 0 6 box5.dat
  [1,16,0,8,0,16,0,0,0,-4,0,0,0,6, ldraw_lib__box5(realsolid)],
// 4 16 -19 8 9 -16 8 6 -16 8 -6 -19 8 -9
  [4,16,-19,8,9,-16,8,6,-16,8,-6,-19,8,-9],
// 4 16 19 8 -9 16 8 -6 16 8 6 19 8 9
  [4,16,19,8,-9,16,8,-6,16,8,6,19,8,9],
// 4 16 19 8 9 16 8 6 -16 8 6 -19 8 9
  [4,16,19,8,9,16,8,6,-16,8,6,-19,8,9],
// 4 16 -19 8 -9 -16 8 -6 16 8 -6 19 8 -9
  [4,16,-19,8,-9,-16,8,-6,16,8,-6,19,8,-9],
// 4 16 -20 7 10 -19 7 9 -19 7 -9 -20 7 -10
  [4,16,-20,7,10,-19,7,9,-19,7,-9,-20,7,-10],
// 4 16 20 7 -10 19 7 -9 19 7 9 20 7 10
  [4,16,20,7,-10,19,7,-9,19,7,9,20,7,10],
// 4 16 20 7 10 19 7 9 -19 7 9 -20 7 10
  [4,16,20,7,10,19,7,9,-19,7,9,-20,7,10],
// 4 16 -20 7 -10 -19 7 -9 19 7 -9 20 7 -10
  [4,16,-20,7,-10,-19,7,-9,19,7,-9,20,7,-10],
// 0 //
];
module ldraw_lib__s__3069bs01(step=0, col=false, unit=2/5, alt=false, line=0.2, solid=!$preview)
    makepoly(ldraw_lib__s__3069bs01(solid), step=step, col=col, unit=unit, alt=alt, line=line, solid=solid);
ldraw_lib__s__3069bs01(line=0.2);
// file: 3004.scad
use <../lib.scad>
use <s/3004s01.scad>
$fa=1; $fs=0.2;
function ldraw_lib__3004(realsolid=false) = [
// 0 Brick  1 x  2
// 0 Name: 3004.dat
// 0 Author: James Jessiman
// 0 !LDRAW_ORG Part UPDATE 2022-05
// 0 !LICENSE Licensed under CC BY 2.0 and CC BY 4.0 : see CAreadme.txt
// 
// 0 BFC CERTIFY CCW
  [0,"BFC","CERTIFY"],
  [0,"BFC","CCW"],
// 
// 0 !HISTORY 2001-10-26 [PTadmin] Official Update 2001-01
// 0 !HISTORY 2002-05-07 {unknown} BFC Certification
// 0 !HISTORY 2002-06-11 [PTadmin] Official Update 2002-03
// 0 !HISTORY 2007-05-07 [PTadmin] Header formatted for Contributor Agreement
// 0 !HISTORY 2008-07-01 [PTadmin] Official Update 2008-01
// 0 !HISTORY 2022-08-04 [MagFors] Using subfile
// 0 !HISTORY 2022-09-15 [PTadmin] Official Update 2022-05
// 
// 
// 1 16 0 0 0 1 0 0 0 1 0 0 0 1 s\3004s01.dat
  [1,16,0,0,0,1,0,0,0,1,0,0,0,1, ldraw_lib__s__3004s01(realsolid)],
// 4 16 -20 24 -10 20 24 -10 20 0 -10 -20 0 -10
  [4,16,-20,24,-10,20,24,-10,20,0,-10,-20,0,-10],
];
module ldraw_lib__3004(step=0, col=false, unit=2/5, alt=false, line=0.2, solid=!$preview)
    makepoly(ldraw_lib__3004(solid), step=step, col=col, unit=unit, alt=alt, line=line, solid=solid);
ldraw_lib__3004(line=0.2);
// file: 3069bp13.scad
use <../lib.scad>
use <s/3069bs01.scad>
use <s/3069p13a.scad>
use <s/3069p13b.scad>
use <s/3069p13c.scad>
$fa=1; $fs=0.2;
function ldraw_lib__3069bp13(realsolid=false) = [
// 0 Tile  1 x  2 with Arrow Short Yellow with Black Border Pattern
// 0 Name: 3069bp13.dat
// 0 Author: James Jessiman
// 0 !LDRAW_ORG Part UPDATE 2010-02
// 0 !LICENSE Licensed under CC BY 2.0 and CC BY 4.0 : see CAreadme.txt
// 
// 0 BFC CERTIFY CCW
  [0,"BFC","CERTIFY"],
  [0,"BFC","CCW"],
// 
// 0 !HISTORY 2002-08-18 [PTadmin] Official Update 2002-04
// 0 !HISTORY 2003-06-08 [jriley] BFC compliant
// 0 !HISTORY 2003-12-19 [PTadmin] Official Update 2003-03
// 0 !HISTORY 2007-06-13 [PTadmin] Header formatted for Contributor Agreement
// 0 !HISTORY 2008-07-01 [PTadmin] Official Update 2008-01
// 0 !HISTORY 2009-08-15 [anathema] Rebuilt using new subparts
// 0 !HISTORY 2010-07-05 [PTadmin] Official Update 2010-02
// 
// 
// 1 16 0 0 0 1 0 0 0 1 0 0 0 1 s\3069bs01.dat
  [1,16,0,0,0,1,0,0,0,1,0,0,0,1, ldraw_lib__s__3069bs01(realsolid)],
// 1 16 0 0 0 1 0 0 0 1 0 0 0 1 s\3069p13a.dat
  [1,16,0,0,0,1,0,0,0,1,0,0,0,1, ldraw_lib__s__3069p13a(realsolid)],
// 1 0 0 0 0 1 0 0 0 1 0 0 0 1 s\3069p13b.dat
  [1,0,0,0,0,1,0,0,0,1,0,0,0,1, ldraw_lib__s__3069p13b(realsolid)],
// 1 14 0 0 0 1 0 0 0 1 0 0 0 1 s\3069p13c.dat
  [1,14,0,0,0,1,0,0,0,1,0,0,0,1, ldraw_lib__s__3069p13c(realsolid)],
// 0
];
module ldraw_lib__3069bp13(step=0, col=false, unit=2/5, alt=false, line=0.2, solid=!$preview)
    makepoly(ldraw_lib__3069bp13(solid), step=step, col=col, unit=unit, alt=alt, line=line, solid=solid);
ldraw_lib__3069bp13(line=0.2);
// main file
use <../lib.scad>
use <3069bp13.scad>
$fa=1; $fs=0.2;
function ldraw_lib__3069p13(realsolid=false) = [
// 0 ~Moved to 3069bp13
// 0 Name: 3069p13.dat
// 0 Author: [PTadmin]
// 0 !LDRAW_ORG Part UPDATE 2002-04
// 0 !LICENSE Licensed under CC BY 4.0 : see CAreadme.txt
// 
// 0 BFC CERTIFY CCW
  [0,"BFC","CERTIFY"],
  [0,"BFC","CCW"],
// 
// 0 !HISTORY 2002-08-18 [PTadmin] Official Update 2002-04
// 0 !HISTORY 2007-06-13 [PTadmin] Header formatted for Contributor Agreement
// 0 !HISTORY 2008-07-01 [PTadmin] Official Update 2008-01
// 
// 
// 1 16 0 0 0 1 0 0 0 1 0 0 0 1 3069bp13.dat
  [1,16,0,0,0,1,0,0,0,1,0,0,0,1, ldraw_lib__3069bp13(realsolid)],
];
module ldraw_lib__3069p13(step=0, col=false, unit=2/5, alt=false, line=0.2, solid=!$preview)
    makepoly(ldraw_lib__3069p13(solid), step=step, col=col, unit=unit, alt=alt, line=line, solid=solid);
ldraw_lib__3069p13(line=0.2);
